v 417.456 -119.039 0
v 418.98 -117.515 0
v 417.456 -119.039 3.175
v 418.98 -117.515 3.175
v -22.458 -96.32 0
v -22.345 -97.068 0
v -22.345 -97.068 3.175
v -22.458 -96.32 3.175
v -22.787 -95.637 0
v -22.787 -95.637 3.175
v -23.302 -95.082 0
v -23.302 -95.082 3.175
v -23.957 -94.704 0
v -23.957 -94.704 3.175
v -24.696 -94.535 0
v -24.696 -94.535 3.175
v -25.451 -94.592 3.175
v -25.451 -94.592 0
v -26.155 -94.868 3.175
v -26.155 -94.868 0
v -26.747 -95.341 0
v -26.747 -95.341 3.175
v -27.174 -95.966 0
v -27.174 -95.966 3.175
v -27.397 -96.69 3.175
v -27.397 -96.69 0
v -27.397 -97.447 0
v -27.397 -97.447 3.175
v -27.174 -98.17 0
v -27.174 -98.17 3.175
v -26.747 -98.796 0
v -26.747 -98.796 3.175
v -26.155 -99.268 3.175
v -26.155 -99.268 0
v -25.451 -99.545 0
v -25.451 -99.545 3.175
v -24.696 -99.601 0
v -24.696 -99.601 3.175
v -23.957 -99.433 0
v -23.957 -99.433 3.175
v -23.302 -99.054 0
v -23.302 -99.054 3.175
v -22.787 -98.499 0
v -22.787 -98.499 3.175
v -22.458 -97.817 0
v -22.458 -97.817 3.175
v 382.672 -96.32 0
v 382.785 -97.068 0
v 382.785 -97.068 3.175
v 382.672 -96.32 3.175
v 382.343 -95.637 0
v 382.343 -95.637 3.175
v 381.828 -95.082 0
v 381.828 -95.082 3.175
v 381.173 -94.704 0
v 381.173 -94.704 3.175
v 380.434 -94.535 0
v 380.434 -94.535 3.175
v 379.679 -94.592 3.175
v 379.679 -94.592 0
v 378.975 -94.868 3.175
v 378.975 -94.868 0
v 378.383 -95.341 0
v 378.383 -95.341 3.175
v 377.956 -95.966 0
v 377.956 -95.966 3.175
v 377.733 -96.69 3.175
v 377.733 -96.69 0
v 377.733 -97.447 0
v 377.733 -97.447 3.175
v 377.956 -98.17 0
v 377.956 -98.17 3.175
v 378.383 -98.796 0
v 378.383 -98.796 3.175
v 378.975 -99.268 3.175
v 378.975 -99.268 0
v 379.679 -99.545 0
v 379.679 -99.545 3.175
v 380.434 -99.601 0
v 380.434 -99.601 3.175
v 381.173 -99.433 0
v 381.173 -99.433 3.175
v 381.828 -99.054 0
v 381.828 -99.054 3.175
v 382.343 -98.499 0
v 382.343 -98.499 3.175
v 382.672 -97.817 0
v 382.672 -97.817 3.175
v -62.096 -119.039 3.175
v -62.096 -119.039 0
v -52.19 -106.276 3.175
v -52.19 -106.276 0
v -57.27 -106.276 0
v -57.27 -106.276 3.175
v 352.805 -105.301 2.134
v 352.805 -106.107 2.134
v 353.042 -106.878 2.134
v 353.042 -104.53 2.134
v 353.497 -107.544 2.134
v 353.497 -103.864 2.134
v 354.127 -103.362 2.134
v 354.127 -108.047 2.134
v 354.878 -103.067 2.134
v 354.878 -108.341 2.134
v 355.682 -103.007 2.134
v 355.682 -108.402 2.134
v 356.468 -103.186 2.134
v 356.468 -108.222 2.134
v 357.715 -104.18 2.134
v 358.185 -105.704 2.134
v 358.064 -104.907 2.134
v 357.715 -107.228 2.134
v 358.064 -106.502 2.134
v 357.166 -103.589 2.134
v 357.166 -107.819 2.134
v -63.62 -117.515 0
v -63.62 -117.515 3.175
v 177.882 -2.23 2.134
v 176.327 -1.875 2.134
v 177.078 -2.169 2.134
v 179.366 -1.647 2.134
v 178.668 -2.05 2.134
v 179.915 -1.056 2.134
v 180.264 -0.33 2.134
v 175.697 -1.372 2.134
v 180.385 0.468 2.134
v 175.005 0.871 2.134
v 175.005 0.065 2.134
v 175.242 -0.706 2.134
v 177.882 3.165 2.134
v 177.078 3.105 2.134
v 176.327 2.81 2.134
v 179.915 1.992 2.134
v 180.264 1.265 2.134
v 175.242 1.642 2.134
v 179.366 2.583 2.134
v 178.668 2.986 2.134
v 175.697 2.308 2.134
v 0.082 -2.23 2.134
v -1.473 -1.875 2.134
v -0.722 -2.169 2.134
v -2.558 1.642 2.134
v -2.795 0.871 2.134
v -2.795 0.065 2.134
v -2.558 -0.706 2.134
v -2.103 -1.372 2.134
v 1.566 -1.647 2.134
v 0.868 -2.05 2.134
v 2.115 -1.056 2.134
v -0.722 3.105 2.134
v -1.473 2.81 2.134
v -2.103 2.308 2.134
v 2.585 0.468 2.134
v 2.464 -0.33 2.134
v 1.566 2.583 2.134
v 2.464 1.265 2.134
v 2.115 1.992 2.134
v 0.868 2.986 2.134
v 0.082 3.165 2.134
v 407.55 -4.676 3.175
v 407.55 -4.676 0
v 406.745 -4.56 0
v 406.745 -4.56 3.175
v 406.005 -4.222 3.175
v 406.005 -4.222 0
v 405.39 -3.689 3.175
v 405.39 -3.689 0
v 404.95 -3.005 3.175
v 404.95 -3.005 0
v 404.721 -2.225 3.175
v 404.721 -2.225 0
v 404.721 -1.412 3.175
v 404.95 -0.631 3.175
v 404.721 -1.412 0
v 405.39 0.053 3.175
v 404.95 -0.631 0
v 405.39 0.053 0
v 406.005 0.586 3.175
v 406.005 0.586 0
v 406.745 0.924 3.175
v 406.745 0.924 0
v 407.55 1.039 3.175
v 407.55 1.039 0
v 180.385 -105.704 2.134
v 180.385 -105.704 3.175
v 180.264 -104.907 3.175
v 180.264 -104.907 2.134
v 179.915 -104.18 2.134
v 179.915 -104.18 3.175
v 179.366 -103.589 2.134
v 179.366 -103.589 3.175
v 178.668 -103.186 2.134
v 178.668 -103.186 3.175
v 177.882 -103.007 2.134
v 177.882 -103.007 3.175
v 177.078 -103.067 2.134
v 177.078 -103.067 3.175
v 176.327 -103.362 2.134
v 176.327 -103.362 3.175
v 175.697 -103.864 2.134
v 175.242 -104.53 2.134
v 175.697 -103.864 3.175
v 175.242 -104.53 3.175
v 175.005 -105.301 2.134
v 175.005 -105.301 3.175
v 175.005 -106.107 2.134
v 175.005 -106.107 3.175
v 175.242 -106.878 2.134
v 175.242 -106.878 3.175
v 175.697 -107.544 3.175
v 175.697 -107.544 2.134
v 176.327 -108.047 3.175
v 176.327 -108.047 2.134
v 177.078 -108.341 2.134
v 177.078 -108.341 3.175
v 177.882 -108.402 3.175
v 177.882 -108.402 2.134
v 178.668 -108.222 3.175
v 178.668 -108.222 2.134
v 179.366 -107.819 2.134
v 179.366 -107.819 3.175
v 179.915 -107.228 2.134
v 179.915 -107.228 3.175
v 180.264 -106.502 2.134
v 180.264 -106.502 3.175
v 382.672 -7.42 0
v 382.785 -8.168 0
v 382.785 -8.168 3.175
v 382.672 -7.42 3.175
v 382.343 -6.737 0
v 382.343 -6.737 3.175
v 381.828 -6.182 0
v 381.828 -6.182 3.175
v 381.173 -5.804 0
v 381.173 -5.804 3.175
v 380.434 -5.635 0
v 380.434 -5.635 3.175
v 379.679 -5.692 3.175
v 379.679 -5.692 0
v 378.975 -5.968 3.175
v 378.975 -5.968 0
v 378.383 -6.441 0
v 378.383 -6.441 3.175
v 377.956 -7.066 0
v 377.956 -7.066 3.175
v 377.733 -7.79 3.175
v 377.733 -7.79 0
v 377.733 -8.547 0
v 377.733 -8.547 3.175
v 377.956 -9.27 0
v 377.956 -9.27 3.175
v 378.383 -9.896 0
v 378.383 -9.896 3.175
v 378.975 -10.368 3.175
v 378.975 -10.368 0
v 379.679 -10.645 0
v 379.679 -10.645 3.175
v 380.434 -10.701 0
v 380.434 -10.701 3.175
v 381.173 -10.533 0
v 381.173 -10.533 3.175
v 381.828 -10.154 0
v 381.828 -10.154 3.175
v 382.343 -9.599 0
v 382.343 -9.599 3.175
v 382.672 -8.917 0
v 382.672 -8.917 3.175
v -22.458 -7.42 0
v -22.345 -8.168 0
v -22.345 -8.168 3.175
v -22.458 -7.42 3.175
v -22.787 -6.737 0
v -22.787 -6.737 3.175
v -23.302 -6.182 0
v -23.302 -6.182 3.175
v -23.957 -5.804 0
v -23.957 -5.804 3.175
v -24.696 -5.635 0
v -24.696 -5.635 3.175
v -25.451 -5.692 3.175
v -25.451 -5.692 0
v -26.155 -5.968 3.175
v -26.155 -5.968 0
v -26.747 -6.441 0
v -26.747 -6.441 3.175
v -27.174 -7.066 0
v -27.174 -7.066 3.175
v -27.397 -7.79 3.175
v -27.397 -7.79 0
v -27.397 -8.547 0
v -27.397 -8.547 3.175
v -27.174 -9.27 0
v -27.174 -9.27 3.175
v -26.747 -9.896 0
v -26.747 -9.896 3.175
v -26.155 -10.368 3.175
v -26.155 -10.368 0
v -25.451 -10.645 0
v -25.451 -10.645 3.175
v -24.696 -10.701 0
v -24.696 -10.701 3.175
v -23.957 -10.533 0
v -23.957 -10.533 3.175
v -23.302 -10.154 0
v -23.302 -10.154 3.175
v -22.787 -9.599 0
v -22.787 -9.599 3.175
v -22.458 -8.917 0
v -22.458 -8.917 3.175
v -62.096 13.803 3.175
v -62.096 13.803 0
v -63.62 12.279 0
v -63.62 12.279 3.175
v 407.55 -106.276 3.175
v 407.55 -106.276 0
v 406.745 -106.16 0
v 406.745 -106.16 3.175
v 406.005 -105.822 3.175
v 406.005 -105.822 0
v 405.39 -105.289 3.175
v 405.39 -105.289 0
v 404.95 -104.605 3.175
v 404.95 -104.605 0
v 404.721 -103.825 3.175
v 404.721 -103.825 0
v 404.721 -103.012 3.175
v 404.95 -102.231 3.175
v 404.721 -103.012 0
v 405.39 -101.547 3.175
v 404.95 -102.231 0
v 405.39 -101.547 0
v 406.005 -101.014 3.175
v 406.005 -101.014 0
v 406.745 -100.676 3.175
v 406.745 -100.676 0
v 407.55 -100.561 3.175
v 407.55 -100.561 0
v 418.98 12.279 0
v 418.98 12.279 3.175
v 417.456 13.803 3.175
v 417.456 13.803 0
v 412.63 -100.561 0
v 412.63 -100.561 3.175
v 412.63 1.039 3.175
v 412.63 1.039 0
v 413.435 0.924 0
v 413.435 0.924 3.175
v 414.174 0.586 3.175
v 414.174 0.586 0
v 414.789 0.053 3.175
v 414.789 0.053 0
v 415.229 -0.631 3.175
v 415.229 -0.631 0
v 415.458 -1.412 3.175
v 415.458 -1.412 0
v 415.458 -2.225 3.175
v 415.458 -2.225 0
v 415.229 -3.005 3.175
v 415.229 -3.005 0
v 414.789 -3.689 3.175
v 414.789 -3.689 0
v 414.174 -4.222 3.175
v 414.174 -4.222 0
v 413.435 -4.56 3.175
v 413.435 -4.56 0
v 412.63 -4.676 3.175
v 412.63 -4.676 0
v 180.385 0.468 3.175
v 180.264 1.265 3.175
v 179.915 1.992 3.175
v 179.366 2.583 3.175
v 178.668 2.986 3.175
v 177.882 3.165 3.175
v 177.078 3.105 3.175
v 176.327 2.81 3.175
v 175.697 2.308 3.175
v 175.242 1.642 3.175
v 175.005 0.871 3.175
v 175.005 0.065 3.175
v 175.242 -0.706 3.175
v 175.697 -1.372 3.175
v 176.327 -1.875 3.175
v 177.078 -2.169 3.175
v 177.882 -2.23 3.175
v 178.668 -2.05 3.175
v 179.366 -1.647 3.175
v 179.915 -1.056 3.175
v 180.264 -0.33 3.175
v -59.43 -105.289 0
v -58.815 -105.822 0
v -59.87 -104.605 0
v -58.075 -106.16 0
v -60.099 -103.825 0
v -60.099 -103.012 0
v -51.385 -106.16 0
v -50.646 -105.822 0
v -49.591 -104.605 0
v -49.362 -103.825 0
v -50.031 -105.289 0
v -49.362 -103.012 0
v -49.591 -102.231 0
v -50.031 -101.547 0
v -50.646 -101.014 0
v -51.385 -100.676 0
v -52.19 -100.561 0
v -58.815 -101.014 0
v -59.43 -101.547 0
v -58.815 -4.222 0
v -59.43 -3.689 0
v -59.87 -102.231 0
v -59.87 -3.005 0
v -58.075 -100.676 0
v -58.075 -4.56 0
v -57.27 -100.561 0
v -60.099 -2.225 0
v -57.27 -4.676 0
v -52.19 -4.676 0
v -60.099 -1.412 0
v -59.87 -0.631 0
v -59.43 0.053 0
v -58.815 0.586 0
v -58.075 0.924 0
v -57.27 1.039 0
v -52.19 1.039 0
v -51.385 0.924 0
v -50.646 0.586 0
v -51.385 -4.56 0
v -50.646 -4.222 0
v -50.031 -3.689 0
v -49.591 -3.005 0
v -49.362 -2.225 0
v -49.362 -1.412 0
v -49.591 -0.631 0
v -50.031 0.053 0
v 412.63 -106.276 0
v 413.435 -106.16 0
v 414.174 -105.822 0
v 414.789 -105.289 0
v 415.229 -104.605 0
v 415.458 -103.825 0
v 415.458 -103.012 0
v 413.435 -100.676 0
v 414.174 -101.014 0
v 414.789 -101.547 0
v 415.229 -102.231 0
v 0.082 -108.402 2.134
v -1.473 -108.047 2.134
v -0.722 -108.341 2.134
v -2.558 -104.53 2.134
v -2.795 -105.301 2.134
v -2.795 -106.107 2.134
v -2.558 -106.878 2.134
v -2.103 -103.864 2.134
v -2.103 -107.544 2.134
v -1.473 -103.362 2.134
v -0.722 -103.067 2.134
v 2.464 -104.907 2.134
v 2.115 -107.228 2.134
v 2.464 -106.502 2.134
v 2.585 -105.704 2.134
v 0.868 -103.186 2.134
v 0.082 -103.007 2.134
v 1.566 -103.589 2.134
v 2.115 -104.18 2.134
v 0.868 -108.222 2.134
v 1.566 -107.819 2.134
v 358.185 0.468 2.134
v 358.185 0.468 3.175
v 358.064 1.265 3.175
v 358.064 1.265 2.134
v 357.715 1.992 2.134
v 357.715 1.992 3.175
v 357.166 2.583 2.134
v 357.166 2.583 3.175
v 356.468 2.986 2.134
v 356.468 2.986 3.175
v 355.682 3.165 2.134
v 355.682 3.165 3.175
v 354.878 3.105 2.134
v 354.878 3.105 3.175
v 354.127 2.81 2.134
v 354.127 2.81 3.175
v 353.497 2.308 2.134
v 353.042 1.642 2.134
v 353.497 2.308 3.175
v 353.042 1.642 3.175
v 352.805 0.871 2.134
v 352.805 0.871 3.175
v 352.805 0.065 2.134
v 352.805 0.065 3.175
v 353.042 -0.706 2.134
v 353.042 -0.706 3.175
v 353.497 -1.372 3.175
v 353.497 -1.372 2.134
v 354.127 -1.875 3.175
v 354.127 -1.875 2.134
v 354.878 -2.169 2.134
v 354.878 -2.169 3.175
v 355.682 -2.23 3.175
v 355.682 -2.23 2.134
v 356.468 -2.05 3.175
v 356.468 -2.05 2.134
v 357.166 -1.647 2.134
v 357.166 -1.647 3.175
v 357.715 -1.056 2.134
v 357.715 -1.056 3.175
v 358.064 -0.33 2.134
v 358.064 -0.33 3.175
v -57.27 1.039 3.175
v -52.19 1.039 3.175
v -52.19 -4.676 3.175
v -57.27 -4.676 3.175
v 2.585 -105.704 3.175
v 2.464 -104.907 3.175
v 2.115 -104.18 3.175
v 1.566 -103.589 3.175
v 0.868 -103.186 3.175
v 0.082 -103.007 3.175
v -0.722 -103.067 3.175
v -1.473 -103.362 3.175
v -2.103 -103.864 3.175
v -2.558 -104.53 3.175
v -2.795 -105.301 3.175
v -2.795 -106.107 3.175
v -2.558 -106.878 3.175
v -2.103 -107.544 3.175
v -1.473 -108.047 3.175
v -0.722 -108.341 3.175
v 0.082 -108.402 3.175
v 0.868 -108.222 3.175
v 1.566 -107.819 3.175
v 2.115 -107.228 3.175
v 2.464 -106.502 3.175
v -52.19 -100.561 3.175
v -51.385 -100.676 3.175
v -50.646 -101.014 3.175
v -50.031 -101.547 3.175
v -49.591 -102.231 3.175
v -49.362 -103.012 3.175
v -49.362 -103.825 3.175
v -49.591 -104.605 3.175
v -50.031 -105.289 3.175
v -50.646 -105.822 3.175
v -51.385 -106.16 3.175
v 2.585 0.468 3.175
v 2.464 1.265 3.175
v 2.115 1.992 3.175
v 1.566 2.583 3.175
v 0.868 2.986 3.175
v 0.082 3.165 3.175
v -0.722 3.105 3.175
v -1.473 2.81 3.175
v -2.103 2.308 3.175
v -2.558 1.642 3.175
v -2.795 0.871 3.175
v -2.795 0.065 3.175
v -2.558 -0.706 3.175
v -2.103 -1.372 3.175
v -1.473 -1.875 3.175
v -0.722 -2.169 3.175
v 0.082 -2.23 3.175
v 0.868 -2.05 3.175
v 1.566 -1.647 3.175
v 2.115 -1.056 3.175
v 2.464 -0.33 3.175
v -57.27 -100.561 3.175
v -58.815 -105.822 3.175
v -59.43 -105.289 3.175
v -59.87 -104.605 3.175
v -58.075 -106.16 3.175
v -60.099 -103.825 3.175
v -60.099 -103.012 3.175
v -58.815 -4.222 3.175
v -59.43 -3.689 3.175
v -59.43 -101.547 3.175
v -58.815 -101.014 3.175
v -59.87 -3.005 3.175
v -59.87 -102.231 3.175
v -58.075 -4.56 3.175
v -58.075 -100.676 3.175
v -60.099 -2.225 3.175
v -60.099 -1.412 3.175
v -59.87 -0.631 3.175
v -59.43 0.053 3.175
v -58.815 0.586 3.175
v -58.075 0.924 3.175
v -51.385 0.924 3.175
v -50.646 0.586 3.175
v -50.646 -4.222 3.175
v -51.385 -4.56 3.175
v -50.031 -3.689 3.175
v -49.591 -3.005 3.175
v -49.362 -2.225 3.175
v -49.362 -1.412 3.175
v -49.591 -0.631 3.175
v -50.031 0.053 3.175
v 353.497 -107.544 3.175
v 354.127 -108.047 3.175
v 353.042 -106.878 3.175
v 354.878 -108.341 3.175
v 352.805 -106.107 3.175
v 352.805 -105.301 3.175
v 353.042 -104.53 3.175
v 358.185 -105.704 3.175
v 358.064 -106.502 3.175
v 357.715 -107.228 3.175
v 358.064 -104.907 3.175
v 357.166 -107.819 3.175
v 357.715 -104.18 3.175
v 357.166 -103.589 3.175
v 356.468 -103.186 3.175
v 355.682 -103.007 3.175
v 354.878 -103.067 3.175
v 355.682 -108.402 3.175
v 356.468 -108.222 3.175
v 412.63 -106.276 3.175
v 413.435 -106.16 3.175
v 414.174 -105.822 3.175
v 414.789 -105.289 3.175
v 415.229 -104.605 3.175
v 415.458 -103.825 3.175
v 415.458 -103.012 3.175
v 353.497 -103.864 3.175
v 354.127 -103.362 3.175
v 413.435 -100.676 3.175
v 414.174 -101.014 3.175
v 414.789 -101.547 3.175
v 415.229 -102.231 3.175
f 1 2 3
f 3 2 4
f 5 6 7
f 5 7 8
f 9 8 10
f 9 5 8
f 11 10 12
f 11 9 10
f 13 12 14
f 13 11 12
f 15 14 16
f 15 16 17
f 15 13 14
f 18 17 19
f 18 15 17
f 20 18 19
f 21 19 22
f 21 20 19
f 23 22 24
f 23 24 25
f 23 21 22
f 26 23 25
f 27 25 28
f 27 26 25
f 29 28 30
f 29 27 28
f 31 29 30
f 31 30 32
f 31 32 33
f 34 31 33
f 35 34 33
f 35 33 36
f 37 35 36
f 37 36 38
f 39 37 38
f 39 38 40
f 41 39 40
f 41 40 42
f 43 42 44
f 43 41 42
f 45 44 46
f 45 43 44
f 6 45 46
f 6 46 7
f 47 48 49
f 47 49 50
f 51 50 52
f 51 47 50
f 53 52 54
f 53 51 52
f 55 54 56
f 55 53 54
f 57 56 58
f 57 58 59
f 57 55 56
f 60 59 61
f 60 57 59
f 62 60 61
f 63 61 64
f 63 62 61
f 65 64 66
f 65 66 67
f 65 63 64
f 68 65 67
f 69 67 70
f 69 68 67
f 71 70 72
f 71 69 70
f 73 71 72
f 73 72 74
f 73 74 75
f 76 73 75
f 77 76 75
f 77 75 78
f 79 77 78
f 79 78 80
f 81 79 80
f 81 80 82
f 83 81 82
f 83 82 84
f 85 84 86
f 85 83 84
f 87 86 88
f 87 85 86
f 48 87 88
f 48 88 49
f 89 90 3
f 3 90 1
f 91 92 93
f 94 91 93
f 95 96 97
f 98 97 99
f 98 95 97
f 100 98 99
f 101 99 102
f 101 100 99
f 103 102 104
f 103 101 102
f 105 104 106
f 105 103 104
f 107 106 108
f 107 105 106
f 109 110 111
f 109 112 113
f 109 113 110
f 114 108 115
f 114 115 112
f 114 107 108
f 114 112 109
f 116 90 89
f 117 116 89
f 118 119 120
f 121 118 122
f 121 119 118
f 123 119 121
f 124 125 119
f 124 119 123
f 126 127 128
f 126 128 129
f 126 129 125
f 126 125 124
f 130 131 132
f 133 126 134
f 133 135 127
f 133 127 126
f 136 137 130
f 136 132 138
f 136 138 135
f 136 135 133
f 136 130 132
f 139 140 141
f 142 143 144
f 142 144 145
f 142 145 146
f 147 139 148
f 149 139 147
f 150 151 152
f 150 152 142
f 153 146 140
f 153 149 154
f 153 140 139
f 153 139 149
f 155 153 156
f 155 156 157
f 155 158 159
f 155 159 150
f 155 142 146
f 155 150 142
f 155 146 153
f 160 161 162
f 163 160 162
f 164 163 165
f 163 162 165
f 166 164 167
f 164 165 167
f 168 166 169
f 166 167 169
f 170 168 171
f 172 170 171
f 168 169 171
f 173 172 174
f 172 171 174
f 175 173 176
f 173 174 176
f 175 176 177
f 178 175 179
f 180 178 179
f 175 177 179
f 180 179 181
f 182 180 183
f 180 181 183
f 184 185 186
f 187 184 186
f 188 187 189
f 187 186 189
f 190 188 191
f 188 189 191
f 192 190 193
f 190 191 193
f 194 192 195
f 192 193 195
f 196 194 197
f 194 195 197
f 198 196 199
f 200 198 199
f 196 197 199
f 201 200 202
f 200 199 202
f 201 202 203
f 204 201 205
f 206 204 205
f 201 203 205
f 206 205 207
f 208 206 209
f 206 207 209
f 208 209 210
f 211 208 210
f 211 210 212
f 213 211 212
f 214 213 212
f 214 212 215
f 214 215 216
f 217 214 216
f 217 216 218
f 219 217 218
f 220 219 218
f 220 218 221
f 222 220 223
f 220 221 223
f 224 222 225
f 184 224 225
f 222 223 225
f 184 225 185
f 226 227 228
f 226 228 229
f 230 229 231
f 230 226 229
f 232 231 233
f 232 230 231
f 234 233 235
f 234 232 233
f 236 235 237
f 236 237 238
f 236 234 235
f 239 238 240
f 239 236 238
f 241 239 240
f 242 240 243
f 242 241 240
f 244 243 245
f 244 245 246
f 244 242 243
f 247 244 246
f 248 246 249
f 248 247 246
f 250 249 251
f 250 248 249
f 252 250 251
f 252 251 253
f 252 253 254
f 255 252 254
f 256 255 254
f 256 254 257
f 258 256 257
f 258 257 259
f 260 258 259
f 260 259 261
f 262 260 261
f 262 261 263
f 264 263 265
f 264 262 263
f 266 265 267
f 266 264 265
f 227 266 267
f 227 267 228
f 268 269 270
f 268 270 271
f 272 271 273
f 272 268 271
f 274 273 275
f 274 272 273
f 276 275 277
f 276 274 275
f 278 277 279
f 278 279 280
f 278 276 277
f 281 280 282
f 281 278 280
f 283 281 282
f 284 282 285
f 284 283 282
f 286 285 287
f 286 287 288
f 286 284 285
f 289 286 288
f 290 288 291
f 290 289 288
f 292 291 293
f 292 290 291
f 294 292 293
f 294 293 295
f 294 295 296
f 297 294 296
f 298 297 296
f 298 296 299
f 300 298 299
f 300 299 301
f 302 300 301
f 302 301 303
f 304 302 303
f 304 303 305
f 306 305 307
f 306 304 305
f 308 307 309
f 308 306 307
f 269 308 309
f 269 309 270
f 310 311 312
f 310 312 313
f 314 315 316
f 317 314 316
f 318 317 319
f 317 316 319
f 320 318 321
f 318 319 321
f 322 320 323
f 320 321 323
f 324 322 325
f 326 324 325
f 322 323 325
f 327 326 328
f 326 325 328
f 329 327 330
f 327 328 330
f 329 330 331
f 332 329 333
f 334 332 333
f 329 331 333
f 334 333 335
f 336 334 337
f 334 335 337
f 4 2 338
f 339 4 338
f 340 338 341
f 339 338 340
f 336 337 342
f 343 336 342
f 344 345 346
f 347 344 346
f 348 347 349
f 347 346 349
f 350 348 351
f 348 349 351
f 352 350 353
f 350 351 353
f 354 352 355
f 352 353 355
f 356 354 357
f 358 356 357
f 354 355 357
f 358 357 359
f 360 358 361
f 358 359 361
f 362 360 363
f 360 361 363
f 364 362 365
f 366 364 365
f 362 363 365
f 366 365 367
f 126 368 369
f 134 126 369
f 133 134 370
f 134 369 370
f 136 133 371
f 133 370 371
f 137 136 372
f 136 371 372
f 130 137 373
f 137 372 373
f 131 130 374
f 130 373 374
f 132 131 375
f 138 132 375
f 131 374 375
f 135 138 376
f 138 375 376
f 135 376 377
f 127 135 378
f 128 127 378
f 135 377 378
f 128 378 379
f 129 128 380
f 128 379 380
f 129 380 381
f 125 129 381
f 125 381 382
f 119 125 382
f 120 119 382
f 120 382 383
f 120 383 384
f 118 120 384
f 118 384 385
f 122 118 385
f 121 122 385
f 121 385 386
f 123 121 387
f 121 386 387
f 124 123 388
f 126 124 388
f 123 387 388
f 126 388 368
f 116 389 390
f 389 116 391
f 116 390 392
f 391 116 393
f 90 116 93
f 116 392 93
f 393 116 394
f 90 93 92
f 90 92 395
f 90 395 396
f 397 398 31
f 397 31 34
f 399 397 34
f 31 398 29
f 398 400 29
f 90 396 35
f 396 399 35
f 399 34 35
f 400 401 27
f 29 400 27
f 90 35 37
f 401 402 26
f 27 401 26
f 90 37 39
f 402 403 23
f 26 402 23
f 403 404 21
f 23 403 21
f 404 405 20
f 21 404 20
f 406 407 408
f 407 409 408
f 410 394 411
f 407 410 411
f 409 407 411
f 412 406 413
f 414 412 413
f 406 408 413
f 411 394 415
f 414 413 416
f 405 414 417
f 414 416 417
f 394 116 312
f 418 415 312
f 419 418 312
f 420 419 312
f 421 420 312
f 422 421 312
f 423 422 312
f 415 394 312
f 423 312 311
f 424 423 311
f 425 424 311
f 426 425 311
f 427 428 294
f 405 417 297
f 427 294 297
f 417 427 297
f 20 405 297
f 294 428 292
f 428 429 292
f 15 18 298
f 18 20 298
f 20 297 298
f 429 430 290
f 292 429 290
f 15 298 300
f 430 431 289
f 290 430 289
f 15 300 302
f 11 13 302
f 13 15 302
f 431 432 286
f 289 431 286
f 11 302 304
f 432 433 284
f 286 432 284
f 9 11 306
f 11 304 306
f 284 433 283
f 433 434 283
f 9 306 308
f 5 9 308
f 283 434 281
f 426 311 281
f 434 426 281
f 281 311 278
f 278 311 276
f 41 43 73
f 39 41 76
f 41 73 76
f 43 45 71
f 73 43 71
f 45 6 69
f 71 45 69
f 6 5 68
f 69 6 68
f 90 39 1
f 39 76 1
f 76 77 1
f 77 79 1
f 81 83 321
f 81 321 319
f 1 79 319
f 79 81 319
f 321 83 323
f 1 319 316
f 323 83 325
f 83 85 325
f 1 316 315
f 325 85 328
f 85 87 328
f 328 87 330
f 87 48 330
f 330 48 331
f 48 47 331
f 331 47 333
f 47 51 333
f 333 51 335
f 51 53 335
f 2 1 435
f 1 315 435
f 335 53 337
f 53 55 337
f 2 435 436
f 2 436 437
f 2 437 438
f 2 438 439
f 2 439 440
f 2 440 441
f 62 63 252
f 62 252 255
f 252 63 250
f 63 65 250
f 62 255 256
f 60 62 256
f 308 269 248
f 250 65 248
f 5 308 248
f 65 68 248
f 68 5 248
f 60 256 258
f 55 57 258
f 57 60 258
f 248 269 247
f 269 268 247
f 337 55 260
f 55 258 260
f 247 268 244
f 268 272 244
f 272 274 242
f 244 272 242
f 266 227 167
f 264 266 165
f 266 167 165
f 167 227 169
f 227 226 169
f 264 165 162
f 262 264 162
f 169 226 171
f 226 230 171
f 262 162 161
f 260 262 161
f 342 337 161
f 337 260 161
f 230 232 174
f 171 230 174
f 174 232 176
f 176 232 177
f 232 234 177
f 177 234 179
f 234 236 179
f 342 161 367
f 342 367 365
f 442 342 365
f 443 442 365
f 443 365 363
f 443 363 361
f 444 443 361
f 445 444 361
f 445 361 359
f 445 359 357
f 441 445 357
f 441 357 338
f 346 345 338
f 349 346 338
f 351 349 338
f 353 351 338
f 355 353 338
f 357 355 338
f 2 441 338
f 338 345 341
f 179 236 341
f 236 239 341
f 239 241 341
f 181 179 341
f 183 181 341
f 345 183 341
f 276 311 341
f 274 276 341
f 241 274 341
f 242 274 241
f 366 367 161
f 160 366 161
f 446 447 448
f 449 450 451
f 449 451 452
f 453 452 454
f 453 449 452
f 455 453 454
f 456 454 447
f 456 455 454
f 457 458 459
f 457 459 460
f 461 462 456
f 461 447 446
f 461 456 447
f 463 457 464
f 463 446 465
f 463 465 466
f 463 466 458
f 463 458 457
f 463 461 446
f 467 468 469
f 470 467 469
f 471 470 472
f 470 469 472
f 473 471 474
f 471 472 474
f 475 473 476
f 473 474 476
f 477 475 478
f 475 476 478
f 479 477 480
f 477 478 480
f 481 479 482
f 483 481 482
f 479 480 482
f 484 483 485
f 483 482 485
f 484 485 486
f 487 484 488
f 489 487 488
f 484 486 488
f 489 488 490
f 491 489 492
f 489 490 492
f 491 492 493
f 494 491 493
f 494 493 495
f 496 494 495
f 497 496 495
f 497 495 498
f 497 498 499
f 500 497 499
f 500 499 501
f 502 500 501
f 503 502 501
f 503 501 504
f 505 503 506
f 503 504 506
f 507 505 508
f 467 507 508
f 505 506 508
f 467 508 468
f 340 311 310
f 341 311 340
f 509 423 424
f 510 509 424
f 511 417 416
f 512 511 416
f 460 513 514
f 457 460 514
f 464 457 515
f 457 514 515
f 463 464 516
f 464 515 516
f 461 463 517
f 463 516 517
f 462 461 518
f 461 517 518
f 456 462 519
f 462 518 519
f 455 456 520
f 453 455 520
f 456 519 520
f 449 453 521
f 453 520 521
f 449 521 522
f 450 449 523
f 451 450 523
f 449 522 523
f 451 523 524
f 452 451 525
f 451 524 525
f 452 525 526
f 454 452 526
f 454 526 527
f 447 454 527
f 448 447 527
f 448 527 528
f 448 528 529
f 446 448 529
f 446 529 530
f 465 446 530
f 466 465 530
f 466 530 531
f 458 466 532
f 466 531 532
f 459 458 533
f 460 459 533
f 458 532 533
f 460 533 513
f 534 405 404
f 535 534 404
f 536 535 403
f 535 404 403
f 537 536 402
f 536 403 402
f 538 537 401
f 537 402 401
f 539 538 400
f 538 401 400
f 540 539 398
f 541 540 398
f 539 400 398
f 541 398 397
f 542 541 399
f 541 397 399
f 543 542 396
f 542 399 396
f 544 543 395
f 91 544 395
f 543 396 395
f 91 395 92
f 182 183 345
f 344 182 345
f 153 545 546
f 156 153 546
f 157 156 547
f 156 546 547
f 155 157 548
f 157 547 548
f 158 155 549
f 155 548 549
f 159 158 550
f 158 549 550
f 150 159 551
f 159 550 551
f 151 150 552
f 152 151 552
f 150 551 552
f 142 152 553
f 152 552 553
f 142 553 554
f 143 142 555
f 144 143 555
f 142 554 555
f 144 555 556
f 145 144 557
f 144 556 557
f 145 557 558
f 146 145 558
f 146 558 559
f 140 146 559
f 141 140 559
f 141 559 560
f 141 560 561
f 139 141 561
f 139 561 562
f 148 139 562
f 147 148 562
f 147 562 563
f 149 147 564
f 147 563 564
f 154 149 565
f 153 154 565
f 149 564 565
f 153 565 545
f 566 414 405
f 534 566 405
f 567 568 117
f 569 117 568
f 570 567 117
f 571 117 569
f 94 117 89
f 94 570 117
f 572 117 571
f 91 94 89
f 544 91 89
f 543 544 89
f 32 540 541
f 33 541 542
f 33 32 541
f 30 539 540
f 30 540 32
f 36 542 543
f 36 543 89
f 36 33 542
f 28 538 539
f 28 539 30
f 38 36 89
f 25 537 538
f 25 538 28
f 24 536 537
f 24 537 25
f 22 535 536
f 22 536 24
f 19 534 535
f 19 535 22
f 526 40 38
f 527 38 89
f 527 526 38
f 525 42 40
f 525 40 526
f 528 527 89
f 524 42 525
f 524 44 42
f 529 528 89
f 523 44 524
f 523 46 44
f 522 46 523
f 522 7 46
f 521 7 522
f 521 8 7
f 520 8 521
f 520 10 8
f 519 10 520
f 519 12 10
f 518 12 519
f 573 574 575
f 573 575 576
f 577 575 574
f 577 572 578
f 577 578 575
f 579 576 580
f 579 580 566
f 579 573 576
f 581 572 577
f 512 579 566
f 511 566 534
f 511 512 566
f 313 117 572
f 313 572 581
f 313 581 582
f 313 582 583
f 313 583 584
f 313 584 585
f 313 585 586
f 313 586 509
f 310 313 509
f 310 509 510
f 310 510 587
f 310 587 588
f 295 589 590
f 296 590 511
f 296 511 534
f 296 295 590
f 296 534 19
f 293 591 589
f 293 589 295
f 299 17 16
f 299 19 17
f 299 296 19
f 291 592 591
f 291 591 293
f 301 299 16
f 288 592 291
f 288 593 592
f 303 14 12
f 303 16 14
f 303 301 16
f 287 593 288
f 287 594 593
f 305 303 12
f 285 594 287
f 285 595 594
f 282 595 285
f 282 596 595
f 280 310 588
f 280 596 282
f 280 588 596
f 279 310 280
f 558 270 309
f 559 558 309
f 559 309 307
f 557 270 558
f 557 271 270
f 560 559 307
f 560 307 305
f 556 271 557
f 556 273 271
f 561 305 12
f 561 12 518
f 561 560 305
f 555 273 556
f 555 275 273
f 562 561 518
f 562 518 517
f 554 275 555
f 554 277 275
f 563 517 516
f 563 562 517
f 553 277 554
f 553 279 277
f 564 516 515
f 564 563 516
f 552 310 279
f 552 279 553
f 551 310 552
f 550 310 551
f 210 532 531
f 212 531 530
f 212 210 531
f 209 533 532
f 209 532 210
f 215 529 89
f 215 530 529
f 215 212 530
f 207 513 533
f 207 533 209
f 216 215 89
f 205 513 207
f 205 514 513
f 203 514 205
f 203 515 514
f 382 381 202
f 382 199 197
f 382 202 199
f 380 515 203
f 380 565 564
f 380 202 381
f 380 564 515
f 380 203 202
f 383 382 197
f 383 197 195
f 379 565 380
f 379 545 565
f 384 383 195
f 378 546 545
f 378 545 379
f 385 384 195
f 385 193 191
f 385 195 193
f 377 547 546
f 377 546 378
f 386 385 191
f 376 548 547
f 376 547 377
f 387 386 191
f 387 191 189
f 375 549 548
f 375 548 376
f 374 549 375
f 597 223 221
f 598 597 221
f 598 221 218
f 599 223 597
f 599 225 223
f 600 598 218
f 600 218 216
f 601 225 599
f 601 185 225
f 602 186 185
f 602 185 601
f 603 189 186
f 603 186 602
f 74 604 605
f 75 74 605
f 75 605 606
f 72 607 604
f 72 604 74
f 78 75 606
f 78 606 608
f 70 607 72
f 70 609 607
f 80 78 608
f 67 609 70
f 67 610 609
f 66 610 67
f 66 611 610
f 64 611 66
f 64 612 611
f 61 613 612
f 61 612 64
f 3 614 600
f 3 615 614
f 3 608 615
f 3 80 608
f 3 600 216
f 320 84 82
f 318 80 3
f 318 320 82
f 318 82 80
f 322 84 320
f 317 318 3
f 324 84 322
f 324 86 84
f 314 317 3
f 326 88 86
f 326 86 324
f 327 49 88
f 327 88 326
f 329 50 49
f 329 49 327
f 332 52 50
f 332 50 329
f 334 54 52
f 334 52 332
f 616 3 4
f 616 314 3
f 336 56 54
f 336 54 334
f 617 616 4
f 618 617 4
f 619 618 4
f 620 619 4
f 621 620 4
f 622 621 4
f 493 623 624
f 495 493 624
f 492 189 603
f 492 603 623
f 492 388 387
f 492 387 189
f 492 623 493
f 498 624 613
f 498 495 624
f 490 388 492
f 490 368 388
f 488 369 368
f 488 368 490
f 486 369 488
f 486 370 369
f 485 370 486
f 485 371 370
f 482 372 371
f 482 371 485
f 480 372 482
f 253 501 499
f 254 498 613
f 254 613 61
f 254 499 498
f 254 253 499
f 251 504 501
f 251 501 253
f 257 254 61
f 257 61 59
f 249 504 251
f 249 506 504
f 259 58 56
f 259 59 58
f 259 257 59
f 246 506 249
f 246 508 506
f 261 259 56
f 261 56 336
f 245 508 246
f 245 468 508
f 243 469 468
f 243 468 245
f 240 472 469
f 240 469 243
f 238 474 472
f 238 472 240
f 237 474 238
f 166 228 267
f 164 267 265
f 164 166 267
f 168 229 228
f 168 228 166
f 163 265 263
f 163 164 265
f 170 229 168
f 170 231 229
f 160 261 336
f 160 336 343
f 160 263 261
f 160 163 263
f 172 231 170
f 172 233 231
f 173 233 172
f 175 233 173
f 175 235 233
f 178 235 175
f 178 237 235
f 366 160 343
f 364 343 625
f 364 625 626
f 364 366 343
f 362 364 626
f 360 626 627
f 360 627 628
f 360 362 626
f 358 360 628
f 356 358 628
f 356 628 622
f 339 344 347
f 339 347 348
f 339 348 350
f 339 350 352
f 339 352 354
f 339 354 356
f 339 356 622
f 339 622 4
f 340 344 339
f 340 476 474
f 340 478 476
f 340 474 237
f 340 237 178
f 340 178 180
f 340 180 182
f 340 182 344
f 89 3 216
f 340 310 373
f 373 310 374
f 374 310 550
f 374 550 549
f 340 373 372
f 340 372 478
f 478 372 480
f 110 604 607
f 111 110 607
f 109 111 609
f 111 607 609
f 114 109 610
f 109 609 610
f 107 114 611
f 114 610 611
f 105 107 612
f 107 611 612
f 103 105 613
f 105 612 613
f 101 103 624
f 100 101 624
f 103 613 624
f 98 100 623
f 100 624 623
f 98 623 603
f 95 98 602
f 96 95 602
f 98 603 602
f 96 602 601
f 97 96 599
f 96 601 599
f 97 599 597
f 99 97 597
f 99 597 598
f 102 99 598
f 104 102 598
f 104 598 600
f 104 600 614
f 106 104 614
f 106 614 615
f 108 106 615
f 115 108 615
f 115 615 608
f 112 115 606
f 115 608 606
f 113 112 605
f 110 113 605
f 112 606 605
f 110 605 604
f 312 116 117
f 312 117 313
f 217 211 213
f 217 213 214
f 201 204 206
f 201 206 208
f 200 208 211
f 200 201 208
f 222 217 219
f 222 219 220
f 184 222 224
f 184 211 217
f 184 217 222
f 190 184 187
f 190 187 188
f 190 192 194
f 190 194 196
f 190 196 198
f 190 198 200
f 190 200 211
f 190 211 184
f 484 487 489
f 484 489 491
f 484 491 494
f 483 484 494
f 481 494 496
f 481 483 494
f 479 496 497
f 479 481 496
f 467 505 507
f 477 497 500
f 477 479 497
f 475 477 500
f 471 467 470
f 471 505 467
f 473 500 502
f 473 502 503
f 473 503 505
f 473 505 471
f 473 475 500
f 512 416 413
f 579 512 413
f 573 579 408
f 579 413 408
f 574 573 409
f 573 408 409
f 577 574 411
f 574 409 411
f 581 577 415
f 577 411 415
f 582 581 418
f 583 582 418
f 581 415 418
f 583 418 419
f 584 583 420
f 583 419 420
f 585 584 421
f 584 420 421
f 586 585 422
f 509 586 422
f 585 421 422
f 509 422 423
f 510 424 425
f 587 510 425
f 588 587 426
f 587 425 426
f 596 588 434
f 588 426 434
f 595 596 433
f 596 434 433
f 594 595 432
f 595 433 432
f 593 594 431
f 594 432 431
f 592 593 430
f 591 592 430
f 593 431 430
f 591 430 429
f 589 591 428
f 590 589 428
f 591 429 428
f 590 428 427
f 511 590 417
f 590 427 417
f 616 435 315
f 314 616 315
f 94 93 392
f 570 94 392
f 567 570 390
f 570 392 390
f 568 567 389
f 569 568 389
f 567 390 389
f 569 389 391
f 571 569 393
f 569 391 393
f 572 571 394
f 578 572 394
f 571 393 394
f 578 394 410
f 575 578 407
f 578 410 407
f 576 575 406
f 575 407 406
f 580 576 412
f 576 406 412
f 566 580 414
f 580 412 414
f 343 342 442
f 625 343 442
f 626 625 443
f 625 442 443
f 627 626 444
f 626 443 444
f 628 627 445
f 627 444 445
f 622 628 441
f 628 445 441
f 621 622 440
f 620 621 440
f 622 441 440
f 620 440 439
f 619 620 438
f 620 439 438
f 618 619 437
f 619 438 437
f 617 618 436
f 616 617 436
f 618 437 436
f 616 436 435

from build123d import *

# Parameters (mm, degrees)
SKETCH1_W           = 482.6
SKETCH1_H           = 132.842
SKETCH1_R           = 2.54
BOSS_EXTRUDE1_DEPTH = 3.175
SKETCH5_R           = 2.7051
CUT_EXTRUDE2_DEPTH  = 1.0414
CHAMFER1_SIZE       = 1.524


with BuildPart() as part:
    # Sketch1 → Boss-Extrude1 (new body)
    with BuildSketch(Plane.XY):
        with Locations((177.679566293, -52.618193378)):
            Rectangle(SKETCH1_W, SKETCH1_H)
        with Locations((-24.885433707, -8.168193378)):
            Circle(SKETCH1_R, mode=Mode.SUBTRACT)
        with Locations((-24.885433707, -97.068193378)):
            Circle(SKETCH1_R, mode=Mode.SUBTRACT)
        with Locations((380.244566293, -97.068193378)):
            Circle(SKETCH1_R, mode=Mode.SUBTRACT)
        with Locations((380.244566293, -8.168193378)):
            Circle(SKETCH1_R, mode=Mode.SUBTRACT)
        with BuildLine():
            Line((-57.270433707, 1.039306622), (-52.190433707, 1.039306622))
            ThreePointArc((-52.190433707, 1.039306622), (-49.332933707, -1.818193378), (-52.190433707, -4.675693378))
            Line((-52.190433707, -4.675693378), (-57.270433707, -4.675693378))
            ThreePointArc((-57.270433707, -4.675693378), (-60.127933707, -1.818193378), (-57.270433707, 1.039306622))
        make_face(mode=Mode.SUBTRACT)
        with BuildLine():
            Line((407.549566293, 1.039306622), (412.629566293, 1.039306622))
            ThreePointArc((412.629566293, 1.039306622), (415.487066293, -1.818193378), (412.629566293, -4.675693378))
            Line((412.629566293, -4.675693378), (407.549566293, -4.675693378))
            ThreePointArc((407.549566293, -4.675693378), (404.692066293, -1.818193378), (407.549566293, 1.039306622))
        make_face(mode=Mode.SUBTRACT)
        with BuildLine():
            Line((-57.270433707, -100.560693378), (-52.190433707, -100.560693378))
            ThreePointArc((-52.190433707, -100.560693378), (-49.332933707, -103.418193378), (-52.190433707, -106.275693378))
            Line((-52.190433707, -106.275693378), (-57.270433707, -106.275693378))
            ThreePointArc((-57.270433707, -106.275693378), (-60.127933707, -103.418193378), (-57.270433707, -100.560693378))
        make_face(mode=Mode.SUBTRACT)
        with BuildLine():
            Line((407.549566293, -100.560693378), (412.629566293, -100.560693378))
            ThreePointArc((412.629566293, -100.560693378), (415.487066293, -103.418193378), (412.629566293, -106.275693378))
            Line((412.629566293, -106.275693378), (407.549566293, -106.275693378))
            ThreePointArc((407.549566293, -106.275693378), (404.692066293, -103.418193378), (407.549566293, -100.560693378))
        make_face(mode=Mode.SUBTRACT)
    extrude(amount=BOSS_EXTRUDE1_DEPTH)

    # Sketch5 → Cut-Extrude2 (cut)
    with BuildSketch(Plane.XY.offset(3.175)):
        with Locations((-0.120433707, 0.467806622)):
            Circle(SKETCH5_R)
        with Locations((177.679566293, 0.467806622)):
            Circle(SKETCH5_R)
        with Locations((355.479566293, 0.467806622)):
            Circle(SKETCH5_R)
        with Locations((177.679566293, -105.704193378)):
            Circle(SKETCH5_R)
        with Locations((355.479566293, -105.704193378)):
            Circle(SKETCH5_R)
        with Locations((-0.120433707, -105.704193378)):
            Circle(SKETCH5_R)
    extrude(amount=-CUT_EXTRUDE2_DEPTH, mode=Mode.SUBTRACT)

    # Chamfer1
    chamfer1_edges = [part.edges().sort_by_distance(p)[0] for p in [
        (-63.620433707, 13.802806622, 1.5875),
        (418.979566293, 13.802806622, 1.5875),
        (418.979566293, -119.039193378, 1.5875),
        (-63.620433707, -119.039193378, 1.5875),
    ]]
    chamfer(chamfer1_edges, length=CHAMFER1_SIZE)


solid = part.part
